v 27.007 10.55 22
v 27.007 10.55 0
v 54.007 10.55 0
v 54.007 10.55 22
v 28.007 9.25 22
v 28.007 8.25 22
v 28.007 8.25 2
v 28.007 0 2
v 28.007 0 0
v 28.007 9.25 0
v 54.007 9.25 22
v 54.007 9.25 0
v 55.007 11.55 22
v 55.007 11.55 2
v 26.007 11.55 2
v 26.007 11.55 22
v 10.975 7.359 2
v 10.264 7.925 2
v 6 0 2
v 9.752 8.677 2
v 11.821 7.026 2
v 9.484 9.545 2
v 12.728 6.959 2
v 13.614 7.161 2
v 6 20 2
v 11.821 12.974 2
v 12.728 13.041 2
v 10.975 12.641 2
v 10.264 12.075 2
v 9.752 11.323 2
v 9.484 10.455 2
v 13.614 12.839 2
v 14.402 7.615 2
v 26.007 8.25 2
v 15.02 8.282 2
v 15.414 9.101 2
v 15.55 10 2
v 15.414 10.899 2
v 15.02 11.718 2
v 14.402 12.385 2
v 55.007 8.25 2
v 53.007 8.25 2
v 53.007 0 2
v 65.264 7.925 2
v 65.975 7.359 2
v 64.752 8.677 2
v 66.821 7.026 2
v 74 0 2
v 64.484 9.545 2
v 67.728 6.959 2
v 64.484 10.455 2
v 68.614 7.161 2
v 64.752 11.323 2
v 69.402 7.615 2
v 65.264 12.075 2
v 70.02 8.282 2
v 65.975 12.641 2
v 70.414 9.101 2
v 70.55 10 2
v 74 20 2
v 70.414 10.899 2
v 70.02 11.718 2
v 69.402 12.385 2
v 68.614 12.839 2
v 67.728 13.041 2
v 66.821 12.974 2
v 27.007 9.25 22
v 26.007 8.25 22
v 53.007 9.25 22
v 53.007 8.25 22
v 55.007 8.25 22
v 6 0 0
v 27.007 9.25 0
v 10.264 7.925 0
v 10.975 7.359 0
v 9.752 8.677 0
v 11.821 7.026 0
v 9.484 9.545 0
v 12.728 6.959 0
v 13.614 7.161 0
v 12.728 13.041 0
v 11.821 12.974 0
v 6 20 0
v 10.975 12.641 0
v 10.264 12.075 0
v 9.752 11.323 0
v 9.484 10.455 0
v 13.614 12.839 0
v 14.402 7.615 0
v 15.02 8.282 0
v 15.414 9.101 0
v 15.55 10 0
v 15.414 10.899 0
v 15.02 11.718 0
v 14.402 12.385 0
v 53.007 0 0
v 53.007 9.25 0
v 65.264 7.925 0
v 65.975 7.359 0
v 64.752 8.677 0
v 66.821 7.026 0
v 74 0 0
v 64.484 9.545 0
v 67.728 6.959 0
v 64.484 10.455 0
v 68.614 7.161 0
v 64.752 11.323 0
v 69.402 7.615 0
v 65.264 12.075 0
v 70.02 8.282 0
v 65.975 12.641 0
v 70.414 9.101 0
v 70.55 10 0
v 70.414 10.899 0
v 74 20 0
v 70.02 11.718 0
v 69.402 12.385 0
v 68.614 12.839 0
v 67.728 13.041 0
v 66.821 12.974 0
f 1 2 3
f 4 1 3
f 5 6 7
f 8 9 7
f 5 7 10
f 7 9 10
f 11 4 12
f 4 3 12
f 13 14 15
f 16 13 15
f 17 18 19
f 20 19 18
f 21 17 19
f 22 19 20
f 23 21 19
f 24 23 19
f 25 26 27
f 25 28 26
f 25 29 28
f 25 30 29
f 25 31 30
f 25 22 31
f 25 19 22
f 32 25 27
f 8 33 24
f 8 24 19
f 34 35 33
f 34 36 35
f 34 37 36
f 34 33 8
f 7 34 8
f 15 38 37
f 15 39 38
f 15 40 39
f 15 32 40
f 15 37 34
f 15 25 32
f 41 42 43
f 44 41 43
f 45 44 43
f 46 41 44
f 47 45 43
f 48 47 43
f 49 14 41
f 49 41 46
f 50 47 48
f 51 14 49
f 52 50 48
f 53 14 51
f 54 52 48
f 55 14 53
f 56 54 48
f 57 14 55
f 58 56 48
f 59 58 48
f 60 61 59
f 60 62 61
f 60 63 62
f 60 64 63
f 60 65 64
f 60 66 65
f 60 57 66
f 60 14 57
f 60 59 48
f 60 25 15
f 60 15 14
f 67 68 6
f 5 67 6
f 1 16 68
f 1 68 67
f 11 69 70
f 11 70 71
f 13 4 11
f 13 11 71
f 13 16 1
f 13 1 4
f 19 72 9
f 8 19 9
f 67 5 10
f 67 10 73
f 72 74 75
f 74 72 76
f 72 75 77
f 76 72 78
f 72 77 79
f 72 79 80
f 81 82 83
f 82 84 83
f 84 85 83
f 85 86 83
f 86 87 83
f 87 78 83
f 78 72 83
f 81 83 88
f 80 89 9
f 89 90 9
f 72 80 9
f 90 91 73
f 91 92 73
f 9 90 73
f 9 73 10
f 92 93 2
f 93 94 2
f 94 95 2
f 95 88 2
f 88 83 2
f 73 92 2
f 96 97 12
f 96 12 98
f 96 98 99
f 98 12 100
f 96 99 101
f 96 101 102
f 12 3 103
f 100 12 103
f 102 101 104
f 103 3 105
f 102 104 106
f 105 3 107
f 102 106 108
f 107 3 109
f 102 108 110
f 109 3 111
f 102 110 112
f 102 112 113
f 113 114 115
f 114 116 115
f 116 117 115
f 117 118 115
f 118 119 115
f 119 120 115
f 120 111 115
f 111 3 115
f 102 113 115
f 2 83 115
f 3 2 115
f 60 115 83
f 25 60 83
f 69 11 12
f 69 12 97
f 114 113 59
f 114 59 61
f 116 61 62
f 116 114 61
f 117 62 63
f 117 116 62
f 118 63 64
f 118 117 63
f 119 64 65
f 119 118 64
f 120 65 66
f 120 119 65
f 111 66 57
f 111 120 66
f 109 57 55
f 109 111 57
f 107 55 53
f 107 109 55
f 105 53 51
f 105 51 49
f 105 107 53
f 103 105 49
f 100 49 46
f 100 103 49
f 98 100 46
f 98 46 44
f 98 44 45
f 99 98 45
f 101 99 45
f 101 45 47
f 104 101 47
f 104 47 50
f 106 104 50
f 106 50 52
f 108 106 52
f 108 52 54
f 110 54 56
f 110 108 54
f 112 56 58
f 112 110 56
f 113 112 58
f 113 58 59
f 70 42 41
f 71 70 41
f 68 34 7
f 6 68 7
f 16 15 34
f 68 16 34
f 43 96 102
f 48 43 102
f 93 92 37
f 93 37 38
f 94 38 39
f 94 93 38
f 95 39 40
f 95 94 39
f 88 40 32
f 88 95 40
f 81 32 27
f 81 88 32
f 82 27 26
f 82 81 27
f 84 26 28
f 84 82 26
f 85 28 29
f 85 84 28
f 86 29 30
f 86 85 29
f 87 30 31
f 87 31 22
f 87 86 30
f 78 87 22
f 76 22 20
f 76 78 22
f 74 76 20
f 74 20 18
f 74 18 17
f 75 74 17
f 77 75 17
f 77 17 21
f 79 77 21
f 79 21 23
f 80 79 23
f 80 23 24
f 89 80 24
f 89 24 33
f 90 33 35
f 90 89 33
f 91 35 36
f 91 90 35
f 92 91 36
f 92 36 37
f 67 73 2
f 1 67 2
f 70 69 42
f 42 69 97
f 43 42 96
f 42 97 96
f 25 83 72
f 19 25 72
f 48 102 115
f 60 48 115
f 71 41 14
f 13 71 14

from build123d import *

# Parameters (mm, degrees)
F0_R     = 3.05
F1_DEPTH = 2
F2_W     = 27
F2_H     = 1
F3_DEPTH = 20


with BuildPart() as f1:
    # F0 (on Top) → F1 (new body)
    with BuildSketch(Plane.XY):
        Polygon((6, 20), (6, 0), (28.006723, 0), (28.006723, 9.25), (27.006723, 9.25), (27.006723, 10.55), (54.006723, 10.55), (54.006723, 9.25), (53.006723, 9.25), (53.006723, 0), (74, 0), (74, 20), align=None)
        with Locations((12.5, 10)):
            Circle(F0_R, mode=Mode.SUBTRACT)
        with Locations((67.5, 10)):
            Circle(F0_R, mode=Mode.SUBTRACT)
    extrude(amount=F1_DEPTH)

    # F2 (on face) → F3 (join)
    with BuildSketch(Plane.XY.offset(2)):
        with Locations((40.506723, 11.05)):
            Rectangle(F2_W, F2_H)
        Polygon((27.006723, 9.25), (27.006723, 10.55), (27.006723, 11.55), (26.006723, 11.55), (26.006723, 9.25), align=None)
        Polygon((54.006723, 11.55), (54.006723, 10.55), (54.006723, 9.25), (55.006723, 9.25), (55.006723, 11.55), align=None)
        Polygon((28.006723, 9.25), (27.006723, 9.25), (26.006723, 9.25), (26.006723, 8.25), (28.006723, 8.25), align=None)
        Polygon((55.006723, 9.25), (54.006723, 9.25), (53.006723, 9.25), (53.006723, 8.25), (55.006723, 8.25), align=None)
    extrude(amount=F3_DEPTH)


solid = f1.part
